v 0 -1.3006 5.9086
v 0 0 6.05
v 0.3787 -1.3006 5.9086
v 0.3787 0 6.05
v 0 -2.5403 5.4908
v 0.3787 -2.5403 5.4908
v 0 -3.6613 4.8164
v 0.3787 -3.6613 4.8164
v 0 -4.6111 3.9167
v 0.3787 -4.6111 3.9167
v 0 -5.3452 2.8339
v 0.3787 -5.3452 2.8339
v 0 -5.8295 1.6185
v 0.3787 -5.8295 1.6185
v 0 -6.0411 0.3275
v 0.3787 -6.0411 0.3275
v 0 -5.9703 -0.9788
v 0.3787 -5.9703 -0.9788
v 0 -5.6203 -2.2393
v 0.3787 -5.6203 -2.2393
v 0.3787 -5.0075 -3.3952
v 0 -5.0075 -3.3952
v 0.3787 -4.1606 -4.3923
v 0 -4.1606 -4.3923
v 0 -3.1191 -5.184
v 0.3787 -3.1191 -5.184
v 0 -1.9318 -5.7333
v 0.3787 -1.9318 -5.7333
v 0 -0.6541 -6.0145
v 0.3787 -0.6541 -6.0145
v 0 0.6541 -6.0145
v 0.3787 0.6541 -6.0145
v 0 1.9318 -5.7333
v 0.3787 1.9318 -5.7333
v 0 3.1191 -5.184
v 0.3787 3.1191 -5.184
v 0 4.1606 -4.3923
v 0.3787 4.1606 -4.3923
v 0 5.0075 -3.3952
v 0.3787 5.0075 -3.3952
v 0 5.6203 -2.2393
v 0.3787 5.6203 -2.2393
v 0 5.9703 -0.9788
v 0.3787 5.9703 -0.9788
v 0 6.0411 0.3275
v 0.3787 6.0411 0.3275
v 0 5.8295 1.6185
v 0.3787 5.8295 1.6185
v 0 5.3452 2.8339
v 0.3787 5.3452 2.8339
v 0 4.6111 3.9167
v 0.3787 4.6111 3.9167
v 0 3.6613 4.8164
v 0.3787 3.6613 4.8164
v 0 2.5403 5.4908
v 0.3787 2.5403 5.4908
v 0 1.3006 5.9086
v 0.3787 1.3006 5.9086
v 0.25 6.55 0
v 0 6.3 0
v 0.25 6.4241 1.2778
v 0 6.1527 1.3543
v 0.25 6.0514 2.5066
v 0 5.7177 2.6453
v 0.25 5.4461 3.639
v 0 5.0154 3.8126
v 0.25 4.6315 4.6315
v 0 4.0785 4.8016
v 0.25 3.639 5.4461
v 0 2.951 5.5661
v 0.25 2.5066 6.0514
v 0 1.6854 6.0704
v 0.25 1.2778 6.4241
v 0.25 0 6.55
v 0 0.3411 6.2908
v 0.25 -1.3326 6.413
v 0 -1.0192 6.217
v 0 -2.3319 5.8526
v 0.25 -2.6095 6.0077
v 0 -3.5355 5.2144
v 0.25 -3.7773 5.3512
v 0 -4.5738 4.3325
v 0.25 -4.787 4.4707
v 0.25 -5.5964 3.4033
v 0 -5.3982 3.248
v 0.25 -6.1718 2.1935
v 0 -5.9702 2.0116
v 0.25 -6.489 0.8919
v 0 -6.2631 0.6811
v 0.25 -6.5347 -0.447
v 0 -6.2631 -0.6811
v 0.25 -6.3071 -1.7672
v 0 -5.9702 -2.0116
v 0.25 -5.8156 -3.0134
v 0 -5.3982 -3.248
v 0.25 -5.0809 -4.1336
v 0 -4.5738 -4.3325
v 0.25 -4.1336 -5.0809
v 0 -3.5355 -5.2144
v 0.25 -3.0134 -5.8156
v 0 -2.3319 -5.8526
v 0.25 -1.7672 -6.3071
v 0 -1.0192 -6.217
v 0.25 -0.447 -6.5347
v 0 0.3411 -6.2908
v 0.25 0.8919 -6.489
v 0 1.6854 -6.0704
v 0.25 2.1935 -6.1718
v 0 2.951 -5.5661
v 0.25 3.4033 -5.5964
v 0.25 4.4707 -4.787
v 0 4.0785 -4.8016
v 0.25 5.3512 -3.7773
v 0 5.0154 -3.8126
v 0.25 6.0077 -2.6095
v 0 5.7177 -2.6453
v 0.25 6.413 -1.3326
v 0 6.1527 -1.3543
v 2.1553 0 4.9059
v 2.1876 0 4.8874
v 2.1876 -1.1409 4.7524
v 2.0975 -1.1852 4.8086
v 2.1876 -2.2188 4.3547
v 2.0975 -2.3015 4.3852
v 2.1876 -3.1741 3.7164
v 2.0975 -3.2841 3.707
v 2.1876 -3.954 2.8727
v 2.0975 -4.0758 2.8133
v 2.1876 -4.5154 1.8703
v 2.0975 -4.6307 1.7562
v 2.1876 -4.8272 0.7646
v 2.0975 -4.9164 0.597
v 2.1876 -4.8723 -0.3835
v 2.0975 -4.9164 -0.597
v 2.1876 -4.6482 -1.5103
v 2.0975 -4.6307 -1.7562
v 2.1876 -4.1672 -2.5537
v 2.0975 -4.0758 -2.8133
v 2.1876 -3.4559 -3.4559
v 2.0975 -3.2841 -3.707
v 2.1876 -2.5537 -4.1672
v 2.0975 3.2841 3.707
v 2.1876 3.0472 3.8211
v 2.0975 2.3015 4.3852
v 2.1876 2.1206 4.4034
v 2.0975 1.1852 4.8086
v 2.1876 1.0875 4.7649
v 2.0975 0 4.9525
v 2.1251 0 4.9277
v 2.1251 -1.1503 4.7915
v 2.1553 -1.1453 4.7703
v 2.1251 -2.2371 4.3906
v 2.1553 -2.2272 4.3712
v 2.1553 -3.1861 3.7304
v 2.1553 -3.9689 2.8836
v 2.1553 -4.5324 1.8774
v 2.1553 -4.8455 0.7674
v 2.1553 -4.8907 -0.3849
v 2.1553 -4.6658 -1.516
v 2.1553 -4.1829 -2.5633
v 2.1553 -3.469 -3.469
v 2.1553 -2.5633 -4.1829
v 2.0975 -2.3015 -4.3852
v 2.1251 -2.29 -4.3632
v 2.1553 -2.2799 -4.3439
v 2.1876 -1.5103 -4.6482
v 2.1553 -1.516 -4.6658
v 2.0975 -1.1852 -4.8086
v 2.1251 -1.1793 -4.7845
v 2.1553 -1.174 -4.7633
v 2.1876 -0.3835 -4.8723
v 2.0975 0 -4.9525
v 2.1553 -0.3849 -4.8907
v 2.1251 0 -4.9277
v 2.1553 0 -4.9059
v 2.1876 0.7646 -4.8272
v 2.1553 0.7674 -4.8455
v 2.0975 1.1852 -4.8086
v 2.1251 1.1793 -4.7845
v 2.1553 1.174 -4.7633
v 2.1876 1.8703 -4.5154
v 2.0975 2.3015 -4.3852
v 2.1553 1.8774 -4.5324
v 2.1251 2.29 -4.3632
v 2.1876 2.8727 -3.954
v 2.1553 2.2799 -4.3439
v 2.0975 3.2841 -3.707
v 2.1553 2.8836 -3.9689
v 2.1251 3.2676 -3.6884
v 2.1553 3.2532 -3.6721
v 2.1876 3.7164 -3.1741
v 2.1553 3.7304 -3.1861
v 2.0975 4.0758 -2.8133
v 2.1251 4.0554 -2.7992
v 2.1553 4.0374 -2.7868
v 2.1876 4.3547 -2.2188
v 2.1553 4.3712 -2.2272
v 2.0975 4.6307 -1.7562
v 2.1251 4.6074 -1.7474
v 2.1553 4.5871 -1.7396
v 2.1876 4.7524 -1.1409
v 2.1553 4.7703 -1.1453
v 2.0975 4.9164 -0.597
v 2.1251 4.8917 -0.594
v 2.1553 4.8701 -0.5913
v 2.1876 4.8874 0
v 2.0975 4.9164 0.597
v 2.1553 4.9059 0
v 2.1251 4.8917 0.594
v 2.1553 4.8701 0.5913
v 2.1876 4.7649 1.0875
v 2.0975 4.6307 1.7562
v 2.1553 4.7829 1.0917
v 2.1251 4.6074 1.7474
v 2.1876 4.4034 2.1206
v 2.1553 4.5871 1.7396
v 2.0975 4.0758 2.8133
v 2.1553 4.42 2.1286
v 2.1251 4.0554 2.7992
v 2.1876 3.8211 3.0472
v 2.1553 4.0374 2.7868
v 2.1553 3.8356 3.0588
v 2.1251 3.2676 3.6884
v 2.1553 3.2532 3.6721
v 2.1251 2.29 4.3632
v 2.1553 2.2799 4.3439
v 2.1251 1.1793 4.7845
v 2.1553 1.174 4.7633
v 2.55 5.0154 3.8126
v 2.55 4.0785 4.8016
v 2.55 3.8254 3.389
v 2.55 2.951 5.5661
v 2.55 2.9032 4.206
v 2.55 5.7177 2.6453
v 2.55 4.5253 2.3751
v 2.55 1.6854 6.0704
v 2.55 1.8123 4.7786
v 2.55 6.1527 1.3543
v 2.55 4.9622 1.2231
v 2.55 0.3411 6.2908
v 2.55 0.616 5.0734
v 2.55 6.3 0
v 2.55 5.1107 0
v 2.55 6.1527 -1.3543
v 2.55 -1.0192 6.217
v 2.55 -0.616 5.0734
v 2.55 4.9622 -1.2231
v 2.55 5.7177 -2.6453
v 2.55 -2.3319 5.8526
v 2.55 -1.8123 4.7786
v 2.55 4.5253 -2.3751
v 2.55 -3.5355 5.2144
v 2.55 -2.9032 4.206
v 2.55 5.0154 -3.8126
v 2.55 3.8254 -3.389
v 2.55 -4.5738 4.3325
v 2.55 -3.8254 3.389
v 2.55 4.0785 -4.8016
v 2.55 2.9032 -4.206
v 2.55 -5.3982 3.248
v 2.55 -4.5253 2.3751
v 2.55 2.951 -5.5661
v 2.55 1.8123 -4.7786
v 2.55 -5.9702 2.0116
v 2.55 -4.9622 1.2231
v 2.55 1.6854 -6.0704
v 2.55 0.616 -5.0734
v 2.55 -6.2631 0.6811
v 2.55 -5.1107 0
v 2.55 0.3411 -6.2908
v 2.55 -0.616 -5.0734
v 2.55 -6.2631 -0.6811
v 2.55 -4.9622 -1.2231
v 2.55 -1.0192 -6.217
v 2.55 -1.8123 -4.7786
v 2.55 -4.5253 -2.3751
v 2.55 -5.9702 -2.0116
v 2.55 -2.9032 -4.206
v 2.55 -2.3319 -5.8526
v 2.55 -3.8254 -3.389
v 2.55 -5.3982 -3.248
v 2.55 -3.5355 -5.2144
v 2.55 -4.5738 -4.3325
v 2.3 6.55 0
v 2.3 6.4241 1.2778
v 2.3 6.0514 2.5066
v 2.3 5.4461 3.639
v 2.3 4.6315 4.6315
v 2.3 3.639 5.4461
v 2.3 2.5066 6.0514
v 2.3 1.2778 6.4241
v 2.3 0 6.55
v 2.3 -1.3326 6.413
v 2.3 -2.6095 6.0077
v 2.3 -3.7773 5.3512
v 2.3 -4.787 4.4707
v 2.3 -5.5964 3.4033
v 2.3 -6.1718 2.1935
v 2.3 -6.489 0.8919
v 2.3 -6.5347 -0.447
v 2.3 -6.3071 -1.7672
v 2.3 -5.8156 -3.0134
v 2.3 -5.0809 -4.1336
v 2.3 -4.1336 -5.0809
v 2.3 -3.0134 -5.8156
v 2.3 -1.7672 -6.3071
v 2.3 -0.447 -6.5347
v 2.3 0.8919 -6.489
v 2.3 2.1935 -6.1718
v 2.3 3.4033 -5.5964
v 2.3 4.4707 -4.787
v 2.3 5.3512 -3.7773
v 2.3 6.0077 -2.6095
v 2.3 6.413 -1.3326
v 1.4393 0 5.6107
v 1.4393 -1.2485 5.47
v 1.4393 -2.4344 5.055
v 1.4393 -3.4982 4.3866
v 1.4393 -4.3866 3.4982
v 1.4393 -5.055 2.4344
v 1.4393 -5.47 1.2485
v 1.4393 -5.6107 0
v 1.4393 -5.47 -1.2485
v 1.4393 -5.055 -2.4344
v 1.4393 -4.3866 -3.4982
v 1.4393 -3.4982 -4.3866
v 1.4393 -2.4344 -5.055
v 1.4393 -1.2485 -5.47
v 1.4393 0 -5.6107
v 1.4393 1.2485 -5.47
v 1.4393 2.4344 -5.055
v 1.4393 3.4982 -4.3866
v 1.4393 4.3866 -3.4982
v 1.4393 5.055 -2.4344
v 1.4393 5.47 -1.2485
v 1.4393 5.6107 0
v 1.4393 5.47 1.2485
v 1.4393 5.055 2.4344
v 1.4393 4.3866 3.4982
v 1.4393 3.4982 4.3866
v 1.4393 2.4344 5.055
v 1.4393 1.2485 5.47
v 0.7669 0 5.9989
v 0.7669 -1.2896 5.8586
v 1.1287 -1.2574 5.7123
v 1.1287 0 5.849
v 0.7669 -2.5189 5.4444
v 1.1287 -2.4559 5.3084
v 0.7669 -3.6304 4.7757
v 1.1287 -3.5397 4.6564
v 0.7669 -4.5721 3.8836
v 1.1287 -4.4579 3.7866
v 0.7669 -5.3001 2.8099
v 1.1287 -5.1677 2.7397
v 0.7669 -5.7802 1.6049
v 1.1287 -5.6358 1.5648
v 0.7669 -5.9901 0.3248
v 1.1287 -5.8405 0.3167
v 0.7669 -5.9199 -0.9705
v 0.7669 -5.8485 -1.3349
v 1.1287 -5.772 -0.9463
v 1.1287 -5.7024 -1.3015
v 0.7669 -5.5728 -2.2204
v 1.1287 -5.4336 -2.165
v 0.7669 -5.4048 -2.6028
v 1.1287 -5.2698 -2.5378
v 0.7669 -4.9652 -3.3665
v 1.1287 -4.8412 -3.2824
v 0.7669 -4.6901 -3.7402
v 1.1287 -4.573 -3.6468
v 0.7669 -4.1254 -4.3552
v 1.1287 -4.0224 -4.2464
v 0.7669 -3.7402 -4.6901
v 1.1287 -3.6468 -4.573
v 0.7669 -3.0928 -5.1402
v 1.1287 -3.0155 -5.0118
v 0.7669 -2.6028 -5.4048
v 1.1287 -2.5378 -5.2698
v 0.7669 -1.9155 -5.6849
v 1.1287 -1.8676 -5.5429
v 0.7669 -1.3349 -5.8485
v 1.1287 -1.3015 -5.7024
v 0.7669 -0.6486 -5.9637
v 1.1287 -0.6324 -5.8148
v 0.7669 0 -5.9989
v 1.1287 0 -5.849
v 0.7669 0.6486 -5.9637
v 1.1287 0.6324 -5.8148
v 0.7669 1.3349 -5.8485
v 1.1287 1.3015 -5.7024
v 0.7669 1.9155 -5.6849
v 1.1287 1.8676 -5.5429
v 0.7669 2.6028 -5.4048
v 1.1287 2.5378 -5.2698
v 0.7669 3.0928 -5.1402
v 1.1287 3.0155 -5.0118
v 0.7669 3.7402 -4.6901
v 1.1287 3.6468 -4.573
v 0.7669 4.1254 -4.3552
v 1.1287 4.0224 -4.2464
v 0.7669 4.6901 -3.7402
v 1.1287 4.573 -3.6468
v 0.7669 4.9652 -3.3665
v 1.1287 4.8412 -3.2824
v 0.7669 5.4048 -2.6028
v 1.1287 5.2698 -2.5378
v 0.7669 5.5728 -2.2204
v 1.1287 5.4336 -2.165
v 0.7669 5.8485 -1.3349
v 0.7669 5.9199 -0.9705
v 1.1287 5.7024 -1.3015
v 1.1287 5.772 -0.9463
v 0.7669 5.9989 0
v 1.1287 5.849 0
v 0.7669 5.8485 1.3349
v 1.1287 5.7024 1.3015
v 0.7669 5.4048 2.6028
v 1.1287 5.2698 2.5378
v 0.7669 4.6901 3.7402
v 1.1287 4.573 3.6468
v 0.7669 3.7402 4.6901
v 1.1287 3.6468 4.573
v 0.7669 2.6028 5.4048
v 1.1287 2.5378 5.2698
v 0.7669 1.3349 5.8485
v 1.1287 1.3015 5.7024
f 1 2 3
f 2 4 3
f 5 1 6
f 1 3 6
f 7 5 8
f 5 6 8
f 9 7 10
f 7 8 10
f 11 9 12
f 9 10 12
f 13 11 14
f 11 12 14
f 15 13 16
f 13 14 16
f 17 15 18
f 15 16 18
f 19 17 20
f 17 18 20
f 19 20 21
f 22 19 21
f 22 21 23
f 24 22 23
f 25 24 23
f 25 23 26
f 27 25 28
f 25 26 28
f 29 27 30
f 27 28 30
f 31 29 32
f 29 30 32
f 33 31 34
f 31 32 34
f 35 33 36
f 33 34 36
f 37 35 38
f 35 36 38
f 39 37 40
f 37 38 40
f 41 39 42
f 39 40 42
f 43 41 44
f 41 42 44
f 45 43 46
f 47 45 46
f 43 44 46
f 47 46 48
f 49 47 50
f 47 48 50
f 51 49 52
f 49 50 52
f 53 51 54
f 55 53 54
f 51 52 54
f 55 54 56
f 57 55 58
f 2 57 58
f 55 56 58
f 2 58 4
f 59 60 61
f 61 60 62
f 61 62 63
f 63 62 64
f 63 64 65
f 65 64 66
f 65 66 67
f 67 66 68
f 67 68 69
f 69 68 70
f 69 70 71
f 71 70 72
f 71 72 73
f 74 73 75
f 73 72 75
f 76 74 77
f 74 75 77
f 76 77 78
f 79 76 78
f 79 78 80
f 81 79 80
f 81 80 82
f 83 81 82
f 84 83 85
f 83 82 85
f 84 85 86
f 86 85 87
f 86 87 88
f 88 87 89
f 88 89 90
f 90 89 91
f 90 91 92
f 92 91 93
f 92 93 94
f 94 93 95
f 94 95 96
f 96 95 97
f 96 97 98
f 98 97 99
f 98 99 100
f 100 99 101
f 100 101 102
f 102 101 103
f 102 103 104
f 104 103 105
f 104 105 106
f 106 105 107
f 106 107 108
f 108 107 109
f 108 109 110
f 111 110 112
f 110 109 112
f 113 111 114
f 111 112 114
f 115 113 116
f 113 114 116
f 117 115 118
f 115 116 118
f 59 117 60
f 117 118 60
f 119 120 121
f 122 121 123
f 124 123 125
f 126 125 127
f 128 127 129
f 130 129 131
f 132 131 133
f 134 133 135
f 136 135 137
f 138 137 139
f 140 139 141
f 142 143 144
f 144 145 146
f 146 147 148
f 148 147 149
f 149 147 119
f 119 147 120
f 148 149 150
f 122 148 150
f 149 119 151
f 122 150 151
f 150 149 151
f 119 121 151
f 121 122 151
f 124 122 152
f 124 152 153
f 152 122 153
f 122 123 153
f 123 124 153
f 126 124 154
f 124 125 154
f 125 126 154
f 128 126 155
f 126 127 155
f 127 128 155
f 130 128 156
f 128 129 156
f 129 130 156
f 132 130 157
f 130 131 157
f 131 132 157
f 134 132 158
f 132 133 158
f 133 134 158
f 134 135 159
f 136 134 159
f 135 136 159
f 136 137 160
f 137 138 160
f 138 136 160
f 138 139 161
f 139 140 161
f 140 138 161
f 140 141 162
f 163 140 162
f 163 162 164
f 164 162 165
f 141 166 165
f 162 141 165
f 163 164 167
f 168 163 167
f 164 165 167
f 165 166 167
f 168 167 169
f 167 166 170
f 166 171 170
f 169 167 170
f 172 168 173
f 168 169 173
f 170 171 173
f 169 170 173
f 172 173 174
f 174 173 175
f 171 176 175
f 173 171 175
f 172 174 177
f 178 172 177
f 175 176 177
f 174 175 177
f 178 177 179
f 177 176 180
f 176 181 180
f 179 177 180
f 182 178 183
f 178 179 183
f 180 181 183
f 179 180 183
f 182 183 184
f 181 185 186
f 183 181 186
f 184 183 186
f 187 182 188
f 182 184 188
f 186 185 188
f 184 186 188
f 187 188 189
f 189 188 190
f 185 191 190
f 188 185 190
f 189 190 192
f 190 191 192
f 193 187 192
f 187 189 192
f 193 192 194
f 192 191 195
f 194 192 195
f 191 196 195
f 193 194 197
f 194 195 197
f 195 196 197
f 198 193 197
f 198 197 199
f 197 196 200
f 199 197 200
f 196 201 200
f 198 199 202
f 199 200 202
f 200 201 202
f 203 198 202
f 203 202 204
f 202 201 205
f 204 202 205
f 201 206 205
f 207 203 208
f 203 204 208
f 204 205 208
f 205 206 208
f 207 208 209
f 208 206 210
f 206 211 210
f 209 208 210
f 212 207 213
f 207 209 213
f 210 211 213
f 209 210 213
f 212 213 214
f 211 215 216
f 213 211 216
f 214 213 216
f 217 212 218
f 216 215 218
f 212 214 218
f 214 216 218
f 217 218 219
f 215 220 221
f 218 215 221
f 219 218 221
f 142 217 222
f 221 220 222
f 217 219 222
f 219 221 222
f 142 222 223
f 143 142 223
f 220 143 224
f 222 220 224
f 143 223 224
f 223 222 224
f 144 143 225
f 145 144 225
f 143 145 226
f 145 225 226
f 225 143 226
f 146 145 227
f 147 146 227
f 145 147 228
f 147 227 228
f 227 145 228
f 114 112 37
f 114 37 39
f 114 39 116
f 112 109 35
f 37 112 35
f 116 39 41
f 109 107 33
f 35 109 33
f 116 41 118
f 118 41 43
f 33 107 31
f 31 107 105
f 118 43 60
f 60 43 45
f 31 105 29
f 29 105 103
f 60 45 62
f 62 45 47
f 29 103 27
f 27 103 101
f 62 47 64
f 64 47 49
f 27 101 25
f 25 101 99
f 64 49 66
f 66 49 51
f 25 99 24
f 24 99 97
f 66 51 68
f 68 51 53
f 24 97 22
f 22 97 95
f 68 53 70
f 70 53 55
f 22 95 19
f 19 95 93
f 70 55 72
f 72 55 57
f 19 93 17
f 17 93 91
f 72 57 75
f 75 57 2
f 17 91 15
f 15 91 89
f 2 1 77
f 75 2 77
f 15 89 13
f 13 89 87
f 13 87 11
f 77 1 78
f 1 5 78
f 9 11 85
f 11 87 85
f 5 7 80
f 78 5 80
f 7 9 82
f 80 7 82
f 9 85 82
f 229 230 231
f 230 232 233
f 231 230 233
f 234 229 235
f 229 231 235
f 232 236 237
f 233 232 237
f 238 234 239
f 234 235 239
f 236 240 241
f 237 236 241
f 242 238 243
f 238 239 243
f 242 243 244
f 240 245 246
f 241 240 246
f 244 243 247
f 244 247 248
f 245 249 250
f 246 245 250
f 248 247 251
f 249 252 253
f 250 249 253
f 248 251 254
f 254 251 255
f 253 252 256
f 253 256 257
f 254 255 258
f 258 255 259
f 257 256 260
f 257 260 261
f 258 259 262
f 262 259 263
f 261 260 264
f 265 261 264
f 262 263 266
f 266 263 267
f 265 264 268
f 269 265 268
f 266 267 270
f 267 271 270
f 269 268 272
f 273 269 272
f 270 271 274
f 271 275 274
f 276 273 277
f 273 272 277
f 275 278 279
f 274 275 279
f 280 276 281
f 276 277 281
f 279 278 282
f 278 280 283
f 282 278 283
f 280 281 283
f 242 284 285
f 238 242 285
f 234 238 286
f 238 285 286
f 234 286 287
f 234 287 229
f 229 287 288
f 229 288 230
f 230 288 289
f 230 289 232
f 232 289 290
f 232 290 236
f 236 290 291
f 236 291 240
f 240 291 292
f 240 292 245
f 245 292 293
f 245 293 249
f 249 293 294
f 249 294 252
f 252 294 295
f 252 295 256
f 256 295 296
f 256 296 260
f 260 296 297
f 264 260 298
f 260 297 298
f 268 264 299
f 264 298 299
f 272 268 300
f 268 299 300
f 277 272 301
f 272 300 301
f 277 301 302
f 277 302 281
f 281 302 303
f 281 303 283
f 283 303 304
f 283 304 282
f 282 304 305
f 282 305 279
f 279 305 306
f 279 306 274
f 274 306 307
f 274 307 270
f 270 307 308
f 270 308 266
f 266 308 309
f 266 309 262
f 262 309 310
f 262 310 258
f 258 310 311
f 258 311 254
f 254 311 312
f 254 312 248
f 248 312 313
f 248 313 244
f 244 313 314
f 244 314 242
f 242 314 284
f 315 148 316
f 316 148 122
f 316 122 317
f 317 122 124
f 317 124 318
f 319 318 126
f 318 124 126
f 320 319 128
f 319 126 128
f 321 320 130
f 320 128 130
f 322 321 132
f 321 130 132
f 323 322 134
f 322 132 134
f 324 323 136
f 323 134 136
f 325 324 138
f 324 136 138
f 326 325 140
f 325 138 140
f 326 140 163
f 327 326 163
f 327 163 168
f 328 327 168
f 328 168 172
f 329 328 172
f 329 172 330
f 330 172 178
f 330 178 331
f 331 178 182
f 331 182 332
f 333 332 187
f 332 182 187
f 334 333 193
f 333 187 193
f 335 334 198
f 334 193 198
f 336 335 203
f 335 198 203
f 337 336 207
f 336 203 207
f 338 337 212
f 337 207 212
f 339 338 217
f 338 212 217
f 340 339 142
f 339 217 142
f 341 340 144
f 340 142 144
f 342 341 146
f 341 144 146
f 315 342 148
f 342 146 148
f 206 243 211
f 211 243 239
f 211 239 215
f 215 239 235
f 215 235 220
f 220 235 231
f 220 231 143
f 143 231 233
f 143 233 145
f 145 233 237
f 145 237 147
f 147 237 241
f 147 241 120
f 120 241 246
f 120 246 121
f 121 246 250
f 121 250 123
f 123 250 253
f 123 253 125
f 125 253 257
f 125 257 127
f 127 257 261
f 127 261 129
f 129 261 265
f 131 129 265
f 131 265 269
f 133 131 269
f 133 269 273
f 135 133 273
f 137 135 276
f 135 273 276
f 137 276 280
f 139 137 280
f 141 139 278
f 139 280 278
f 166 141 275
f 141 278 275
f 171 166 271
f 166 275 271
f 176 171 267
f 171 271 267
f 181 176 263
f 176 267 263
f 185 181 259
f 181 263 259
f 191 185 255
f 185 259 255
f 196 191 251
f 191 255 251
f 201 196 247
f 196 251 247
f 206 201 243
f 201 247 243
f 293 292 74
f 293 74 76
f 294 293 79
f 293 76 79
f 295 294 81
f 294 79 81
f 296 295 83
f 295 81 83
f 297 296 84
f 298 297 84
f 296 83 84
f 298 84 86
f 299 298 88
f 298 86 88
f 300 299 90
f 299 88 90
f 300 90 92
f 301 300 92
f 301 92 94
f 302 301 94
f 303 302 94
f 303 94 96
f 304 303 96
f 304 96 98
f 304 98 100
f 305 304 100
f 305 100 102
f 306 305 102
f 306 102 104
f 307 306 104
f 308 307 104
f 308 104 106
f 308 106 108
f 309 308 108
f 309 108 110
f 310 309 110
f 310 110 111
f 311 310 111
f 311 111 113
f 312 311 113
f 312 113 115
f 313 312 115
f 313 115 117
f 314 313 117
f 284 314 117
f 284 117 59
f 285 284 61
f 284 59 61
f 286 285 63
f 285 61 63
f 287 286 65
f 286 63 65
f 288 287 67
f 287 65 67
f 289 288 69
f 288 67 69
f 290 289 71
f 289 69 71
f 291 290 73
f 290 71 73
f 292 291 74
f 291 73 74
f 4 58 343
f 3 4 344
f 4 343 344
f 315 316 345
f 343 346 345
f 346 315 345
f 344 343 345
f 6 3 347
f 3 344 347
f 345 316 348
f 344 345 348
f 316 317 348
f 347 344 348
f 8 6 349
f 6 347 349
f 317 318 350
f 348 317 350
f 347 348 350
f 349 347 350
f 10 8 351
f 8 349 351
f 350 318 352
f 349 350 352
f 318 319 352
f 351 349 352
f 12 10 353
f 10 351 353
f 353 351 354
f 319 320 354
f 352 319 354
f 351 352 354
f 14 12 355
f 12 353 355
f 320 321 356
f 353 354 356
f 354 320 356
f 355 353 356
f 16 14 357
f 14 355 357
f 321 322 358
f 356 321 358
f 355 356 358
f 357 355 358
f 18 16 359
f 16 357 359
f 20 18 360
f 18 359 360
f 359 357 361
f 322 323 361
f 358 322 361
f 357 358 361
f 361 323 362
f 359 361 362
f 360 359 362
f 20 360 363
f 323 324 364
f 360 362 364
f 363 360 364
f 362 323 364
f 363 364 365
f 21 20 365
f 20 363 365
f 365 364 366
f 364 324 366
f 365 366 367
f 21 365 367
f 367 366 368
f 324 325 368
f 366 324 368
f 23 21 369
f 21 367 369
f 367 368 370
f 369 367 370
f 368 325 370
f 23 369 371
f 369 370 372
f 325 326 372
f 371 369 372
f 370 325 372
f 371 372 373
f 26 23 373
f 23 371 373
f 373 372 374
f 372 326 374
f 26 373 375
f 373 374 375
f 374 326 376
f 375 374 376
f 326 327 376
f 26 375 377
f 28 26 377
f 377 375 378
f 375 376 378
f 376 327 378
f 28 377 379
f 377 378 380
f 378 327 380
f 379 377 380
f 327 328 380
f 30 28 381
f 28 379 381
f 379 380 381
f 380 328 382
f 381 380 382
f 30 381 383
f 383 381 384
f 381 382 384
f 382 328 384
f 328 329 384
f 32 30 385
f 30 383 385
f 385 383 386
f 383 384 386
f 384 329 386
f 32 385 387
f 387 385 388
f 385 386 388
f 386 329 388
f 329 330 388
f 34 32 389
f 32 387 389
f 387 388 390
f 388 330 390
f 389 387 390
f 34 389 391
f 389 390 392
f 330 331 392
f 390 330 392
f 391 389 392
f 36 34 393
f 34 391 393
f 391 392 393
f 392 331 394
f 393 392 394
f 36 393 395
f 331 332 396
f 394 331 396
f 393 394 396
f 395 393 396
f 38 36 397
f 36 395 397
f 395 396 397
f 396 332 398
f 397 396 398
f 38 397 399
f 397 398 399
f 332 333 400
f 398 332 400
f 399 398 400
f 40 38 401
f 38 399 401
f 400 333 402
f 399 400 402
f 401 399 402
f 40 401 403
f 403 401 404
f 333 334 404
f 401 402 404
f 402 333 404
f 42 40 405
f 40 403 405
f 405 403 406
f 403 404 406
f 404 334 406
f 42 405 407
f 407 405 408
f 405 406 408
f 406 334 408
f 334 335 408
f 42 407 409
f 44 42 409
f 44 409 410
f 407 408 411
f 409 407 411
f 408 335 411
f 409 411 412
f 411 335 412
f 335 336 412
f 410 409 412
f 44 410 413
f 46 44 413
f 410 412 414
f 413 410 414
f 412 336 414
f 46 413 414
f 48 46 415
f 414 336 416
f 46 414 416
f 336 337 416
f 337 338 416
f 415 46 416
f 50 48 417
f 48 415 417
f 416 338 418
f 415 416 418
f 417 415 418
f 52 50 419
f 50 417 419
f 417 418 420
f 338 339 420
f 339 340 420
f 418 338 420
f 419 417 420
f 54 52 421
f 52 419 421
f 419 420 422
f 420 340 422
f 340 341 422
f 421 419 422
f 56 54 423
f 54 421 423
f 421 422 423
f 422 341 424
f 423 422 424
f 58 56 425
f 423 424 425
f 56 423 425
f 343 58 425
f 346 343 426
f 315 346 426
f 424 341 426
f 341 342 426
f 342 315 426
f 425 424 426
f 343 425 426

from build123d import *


with BuildPart() as part:
    # Çizim1 → Döndür1 (revolve)
    with BuildSketch(Plane.XY, mode=Mode.PRIVATE) as d_nd_r1_sk:
        with BuildLine():
            Line((0, 6.55), (0, 6.05))
            Line((0, 6.05), (0.378679656, 6.05))
            ThreePointArc((0.378679656, 6.05), (0.952704805, 5.935819299), (1.439339828, 5.610660172))
            Line((1.439339828, 5.610660172), (2.097487373, 4.952512627))
            ThreePointArc((2.097487373, 4.952512627), (2.211035546, 4.876642164), (2.344974747, 4.85))
            Line((2.344974747, 4.85), (2.55, 4.85))
            Line((2.55, 4.85), (2.55, 6.55))
            Line((2.55, 6.55), (0, 6.55))
        make_face()
    revolve(d_nd_r1_sk.sketch.rotate(Axis((0, 0, 0), (1, 0, 0)), 90), axis=Axis((0, 0, 0), (1, 0, 0)))

    # Pah1: read off the stored shape, not the designer's step
    # Pah1 outline → Pah1 (revolve, cut)
    with BuildSketch(Plane.YX):
        Polygon((4.887395483, 2.187563133), (5.110684424, 2.55), (4.85, 2.55), (4.85, 2.187563133), align=None)
        Polygon((6.55, 2.55), (6.3, 2.55), (6.55, 2.3), align=None)
        Polygon((6.55, 0), (6.55, 0.25), (6.3, 0), align=None)
    revolve(axis=Axis((0, 0, 0), (1, 0, 0)), mode=Mode.SUBTRACT)


solid = part.part
